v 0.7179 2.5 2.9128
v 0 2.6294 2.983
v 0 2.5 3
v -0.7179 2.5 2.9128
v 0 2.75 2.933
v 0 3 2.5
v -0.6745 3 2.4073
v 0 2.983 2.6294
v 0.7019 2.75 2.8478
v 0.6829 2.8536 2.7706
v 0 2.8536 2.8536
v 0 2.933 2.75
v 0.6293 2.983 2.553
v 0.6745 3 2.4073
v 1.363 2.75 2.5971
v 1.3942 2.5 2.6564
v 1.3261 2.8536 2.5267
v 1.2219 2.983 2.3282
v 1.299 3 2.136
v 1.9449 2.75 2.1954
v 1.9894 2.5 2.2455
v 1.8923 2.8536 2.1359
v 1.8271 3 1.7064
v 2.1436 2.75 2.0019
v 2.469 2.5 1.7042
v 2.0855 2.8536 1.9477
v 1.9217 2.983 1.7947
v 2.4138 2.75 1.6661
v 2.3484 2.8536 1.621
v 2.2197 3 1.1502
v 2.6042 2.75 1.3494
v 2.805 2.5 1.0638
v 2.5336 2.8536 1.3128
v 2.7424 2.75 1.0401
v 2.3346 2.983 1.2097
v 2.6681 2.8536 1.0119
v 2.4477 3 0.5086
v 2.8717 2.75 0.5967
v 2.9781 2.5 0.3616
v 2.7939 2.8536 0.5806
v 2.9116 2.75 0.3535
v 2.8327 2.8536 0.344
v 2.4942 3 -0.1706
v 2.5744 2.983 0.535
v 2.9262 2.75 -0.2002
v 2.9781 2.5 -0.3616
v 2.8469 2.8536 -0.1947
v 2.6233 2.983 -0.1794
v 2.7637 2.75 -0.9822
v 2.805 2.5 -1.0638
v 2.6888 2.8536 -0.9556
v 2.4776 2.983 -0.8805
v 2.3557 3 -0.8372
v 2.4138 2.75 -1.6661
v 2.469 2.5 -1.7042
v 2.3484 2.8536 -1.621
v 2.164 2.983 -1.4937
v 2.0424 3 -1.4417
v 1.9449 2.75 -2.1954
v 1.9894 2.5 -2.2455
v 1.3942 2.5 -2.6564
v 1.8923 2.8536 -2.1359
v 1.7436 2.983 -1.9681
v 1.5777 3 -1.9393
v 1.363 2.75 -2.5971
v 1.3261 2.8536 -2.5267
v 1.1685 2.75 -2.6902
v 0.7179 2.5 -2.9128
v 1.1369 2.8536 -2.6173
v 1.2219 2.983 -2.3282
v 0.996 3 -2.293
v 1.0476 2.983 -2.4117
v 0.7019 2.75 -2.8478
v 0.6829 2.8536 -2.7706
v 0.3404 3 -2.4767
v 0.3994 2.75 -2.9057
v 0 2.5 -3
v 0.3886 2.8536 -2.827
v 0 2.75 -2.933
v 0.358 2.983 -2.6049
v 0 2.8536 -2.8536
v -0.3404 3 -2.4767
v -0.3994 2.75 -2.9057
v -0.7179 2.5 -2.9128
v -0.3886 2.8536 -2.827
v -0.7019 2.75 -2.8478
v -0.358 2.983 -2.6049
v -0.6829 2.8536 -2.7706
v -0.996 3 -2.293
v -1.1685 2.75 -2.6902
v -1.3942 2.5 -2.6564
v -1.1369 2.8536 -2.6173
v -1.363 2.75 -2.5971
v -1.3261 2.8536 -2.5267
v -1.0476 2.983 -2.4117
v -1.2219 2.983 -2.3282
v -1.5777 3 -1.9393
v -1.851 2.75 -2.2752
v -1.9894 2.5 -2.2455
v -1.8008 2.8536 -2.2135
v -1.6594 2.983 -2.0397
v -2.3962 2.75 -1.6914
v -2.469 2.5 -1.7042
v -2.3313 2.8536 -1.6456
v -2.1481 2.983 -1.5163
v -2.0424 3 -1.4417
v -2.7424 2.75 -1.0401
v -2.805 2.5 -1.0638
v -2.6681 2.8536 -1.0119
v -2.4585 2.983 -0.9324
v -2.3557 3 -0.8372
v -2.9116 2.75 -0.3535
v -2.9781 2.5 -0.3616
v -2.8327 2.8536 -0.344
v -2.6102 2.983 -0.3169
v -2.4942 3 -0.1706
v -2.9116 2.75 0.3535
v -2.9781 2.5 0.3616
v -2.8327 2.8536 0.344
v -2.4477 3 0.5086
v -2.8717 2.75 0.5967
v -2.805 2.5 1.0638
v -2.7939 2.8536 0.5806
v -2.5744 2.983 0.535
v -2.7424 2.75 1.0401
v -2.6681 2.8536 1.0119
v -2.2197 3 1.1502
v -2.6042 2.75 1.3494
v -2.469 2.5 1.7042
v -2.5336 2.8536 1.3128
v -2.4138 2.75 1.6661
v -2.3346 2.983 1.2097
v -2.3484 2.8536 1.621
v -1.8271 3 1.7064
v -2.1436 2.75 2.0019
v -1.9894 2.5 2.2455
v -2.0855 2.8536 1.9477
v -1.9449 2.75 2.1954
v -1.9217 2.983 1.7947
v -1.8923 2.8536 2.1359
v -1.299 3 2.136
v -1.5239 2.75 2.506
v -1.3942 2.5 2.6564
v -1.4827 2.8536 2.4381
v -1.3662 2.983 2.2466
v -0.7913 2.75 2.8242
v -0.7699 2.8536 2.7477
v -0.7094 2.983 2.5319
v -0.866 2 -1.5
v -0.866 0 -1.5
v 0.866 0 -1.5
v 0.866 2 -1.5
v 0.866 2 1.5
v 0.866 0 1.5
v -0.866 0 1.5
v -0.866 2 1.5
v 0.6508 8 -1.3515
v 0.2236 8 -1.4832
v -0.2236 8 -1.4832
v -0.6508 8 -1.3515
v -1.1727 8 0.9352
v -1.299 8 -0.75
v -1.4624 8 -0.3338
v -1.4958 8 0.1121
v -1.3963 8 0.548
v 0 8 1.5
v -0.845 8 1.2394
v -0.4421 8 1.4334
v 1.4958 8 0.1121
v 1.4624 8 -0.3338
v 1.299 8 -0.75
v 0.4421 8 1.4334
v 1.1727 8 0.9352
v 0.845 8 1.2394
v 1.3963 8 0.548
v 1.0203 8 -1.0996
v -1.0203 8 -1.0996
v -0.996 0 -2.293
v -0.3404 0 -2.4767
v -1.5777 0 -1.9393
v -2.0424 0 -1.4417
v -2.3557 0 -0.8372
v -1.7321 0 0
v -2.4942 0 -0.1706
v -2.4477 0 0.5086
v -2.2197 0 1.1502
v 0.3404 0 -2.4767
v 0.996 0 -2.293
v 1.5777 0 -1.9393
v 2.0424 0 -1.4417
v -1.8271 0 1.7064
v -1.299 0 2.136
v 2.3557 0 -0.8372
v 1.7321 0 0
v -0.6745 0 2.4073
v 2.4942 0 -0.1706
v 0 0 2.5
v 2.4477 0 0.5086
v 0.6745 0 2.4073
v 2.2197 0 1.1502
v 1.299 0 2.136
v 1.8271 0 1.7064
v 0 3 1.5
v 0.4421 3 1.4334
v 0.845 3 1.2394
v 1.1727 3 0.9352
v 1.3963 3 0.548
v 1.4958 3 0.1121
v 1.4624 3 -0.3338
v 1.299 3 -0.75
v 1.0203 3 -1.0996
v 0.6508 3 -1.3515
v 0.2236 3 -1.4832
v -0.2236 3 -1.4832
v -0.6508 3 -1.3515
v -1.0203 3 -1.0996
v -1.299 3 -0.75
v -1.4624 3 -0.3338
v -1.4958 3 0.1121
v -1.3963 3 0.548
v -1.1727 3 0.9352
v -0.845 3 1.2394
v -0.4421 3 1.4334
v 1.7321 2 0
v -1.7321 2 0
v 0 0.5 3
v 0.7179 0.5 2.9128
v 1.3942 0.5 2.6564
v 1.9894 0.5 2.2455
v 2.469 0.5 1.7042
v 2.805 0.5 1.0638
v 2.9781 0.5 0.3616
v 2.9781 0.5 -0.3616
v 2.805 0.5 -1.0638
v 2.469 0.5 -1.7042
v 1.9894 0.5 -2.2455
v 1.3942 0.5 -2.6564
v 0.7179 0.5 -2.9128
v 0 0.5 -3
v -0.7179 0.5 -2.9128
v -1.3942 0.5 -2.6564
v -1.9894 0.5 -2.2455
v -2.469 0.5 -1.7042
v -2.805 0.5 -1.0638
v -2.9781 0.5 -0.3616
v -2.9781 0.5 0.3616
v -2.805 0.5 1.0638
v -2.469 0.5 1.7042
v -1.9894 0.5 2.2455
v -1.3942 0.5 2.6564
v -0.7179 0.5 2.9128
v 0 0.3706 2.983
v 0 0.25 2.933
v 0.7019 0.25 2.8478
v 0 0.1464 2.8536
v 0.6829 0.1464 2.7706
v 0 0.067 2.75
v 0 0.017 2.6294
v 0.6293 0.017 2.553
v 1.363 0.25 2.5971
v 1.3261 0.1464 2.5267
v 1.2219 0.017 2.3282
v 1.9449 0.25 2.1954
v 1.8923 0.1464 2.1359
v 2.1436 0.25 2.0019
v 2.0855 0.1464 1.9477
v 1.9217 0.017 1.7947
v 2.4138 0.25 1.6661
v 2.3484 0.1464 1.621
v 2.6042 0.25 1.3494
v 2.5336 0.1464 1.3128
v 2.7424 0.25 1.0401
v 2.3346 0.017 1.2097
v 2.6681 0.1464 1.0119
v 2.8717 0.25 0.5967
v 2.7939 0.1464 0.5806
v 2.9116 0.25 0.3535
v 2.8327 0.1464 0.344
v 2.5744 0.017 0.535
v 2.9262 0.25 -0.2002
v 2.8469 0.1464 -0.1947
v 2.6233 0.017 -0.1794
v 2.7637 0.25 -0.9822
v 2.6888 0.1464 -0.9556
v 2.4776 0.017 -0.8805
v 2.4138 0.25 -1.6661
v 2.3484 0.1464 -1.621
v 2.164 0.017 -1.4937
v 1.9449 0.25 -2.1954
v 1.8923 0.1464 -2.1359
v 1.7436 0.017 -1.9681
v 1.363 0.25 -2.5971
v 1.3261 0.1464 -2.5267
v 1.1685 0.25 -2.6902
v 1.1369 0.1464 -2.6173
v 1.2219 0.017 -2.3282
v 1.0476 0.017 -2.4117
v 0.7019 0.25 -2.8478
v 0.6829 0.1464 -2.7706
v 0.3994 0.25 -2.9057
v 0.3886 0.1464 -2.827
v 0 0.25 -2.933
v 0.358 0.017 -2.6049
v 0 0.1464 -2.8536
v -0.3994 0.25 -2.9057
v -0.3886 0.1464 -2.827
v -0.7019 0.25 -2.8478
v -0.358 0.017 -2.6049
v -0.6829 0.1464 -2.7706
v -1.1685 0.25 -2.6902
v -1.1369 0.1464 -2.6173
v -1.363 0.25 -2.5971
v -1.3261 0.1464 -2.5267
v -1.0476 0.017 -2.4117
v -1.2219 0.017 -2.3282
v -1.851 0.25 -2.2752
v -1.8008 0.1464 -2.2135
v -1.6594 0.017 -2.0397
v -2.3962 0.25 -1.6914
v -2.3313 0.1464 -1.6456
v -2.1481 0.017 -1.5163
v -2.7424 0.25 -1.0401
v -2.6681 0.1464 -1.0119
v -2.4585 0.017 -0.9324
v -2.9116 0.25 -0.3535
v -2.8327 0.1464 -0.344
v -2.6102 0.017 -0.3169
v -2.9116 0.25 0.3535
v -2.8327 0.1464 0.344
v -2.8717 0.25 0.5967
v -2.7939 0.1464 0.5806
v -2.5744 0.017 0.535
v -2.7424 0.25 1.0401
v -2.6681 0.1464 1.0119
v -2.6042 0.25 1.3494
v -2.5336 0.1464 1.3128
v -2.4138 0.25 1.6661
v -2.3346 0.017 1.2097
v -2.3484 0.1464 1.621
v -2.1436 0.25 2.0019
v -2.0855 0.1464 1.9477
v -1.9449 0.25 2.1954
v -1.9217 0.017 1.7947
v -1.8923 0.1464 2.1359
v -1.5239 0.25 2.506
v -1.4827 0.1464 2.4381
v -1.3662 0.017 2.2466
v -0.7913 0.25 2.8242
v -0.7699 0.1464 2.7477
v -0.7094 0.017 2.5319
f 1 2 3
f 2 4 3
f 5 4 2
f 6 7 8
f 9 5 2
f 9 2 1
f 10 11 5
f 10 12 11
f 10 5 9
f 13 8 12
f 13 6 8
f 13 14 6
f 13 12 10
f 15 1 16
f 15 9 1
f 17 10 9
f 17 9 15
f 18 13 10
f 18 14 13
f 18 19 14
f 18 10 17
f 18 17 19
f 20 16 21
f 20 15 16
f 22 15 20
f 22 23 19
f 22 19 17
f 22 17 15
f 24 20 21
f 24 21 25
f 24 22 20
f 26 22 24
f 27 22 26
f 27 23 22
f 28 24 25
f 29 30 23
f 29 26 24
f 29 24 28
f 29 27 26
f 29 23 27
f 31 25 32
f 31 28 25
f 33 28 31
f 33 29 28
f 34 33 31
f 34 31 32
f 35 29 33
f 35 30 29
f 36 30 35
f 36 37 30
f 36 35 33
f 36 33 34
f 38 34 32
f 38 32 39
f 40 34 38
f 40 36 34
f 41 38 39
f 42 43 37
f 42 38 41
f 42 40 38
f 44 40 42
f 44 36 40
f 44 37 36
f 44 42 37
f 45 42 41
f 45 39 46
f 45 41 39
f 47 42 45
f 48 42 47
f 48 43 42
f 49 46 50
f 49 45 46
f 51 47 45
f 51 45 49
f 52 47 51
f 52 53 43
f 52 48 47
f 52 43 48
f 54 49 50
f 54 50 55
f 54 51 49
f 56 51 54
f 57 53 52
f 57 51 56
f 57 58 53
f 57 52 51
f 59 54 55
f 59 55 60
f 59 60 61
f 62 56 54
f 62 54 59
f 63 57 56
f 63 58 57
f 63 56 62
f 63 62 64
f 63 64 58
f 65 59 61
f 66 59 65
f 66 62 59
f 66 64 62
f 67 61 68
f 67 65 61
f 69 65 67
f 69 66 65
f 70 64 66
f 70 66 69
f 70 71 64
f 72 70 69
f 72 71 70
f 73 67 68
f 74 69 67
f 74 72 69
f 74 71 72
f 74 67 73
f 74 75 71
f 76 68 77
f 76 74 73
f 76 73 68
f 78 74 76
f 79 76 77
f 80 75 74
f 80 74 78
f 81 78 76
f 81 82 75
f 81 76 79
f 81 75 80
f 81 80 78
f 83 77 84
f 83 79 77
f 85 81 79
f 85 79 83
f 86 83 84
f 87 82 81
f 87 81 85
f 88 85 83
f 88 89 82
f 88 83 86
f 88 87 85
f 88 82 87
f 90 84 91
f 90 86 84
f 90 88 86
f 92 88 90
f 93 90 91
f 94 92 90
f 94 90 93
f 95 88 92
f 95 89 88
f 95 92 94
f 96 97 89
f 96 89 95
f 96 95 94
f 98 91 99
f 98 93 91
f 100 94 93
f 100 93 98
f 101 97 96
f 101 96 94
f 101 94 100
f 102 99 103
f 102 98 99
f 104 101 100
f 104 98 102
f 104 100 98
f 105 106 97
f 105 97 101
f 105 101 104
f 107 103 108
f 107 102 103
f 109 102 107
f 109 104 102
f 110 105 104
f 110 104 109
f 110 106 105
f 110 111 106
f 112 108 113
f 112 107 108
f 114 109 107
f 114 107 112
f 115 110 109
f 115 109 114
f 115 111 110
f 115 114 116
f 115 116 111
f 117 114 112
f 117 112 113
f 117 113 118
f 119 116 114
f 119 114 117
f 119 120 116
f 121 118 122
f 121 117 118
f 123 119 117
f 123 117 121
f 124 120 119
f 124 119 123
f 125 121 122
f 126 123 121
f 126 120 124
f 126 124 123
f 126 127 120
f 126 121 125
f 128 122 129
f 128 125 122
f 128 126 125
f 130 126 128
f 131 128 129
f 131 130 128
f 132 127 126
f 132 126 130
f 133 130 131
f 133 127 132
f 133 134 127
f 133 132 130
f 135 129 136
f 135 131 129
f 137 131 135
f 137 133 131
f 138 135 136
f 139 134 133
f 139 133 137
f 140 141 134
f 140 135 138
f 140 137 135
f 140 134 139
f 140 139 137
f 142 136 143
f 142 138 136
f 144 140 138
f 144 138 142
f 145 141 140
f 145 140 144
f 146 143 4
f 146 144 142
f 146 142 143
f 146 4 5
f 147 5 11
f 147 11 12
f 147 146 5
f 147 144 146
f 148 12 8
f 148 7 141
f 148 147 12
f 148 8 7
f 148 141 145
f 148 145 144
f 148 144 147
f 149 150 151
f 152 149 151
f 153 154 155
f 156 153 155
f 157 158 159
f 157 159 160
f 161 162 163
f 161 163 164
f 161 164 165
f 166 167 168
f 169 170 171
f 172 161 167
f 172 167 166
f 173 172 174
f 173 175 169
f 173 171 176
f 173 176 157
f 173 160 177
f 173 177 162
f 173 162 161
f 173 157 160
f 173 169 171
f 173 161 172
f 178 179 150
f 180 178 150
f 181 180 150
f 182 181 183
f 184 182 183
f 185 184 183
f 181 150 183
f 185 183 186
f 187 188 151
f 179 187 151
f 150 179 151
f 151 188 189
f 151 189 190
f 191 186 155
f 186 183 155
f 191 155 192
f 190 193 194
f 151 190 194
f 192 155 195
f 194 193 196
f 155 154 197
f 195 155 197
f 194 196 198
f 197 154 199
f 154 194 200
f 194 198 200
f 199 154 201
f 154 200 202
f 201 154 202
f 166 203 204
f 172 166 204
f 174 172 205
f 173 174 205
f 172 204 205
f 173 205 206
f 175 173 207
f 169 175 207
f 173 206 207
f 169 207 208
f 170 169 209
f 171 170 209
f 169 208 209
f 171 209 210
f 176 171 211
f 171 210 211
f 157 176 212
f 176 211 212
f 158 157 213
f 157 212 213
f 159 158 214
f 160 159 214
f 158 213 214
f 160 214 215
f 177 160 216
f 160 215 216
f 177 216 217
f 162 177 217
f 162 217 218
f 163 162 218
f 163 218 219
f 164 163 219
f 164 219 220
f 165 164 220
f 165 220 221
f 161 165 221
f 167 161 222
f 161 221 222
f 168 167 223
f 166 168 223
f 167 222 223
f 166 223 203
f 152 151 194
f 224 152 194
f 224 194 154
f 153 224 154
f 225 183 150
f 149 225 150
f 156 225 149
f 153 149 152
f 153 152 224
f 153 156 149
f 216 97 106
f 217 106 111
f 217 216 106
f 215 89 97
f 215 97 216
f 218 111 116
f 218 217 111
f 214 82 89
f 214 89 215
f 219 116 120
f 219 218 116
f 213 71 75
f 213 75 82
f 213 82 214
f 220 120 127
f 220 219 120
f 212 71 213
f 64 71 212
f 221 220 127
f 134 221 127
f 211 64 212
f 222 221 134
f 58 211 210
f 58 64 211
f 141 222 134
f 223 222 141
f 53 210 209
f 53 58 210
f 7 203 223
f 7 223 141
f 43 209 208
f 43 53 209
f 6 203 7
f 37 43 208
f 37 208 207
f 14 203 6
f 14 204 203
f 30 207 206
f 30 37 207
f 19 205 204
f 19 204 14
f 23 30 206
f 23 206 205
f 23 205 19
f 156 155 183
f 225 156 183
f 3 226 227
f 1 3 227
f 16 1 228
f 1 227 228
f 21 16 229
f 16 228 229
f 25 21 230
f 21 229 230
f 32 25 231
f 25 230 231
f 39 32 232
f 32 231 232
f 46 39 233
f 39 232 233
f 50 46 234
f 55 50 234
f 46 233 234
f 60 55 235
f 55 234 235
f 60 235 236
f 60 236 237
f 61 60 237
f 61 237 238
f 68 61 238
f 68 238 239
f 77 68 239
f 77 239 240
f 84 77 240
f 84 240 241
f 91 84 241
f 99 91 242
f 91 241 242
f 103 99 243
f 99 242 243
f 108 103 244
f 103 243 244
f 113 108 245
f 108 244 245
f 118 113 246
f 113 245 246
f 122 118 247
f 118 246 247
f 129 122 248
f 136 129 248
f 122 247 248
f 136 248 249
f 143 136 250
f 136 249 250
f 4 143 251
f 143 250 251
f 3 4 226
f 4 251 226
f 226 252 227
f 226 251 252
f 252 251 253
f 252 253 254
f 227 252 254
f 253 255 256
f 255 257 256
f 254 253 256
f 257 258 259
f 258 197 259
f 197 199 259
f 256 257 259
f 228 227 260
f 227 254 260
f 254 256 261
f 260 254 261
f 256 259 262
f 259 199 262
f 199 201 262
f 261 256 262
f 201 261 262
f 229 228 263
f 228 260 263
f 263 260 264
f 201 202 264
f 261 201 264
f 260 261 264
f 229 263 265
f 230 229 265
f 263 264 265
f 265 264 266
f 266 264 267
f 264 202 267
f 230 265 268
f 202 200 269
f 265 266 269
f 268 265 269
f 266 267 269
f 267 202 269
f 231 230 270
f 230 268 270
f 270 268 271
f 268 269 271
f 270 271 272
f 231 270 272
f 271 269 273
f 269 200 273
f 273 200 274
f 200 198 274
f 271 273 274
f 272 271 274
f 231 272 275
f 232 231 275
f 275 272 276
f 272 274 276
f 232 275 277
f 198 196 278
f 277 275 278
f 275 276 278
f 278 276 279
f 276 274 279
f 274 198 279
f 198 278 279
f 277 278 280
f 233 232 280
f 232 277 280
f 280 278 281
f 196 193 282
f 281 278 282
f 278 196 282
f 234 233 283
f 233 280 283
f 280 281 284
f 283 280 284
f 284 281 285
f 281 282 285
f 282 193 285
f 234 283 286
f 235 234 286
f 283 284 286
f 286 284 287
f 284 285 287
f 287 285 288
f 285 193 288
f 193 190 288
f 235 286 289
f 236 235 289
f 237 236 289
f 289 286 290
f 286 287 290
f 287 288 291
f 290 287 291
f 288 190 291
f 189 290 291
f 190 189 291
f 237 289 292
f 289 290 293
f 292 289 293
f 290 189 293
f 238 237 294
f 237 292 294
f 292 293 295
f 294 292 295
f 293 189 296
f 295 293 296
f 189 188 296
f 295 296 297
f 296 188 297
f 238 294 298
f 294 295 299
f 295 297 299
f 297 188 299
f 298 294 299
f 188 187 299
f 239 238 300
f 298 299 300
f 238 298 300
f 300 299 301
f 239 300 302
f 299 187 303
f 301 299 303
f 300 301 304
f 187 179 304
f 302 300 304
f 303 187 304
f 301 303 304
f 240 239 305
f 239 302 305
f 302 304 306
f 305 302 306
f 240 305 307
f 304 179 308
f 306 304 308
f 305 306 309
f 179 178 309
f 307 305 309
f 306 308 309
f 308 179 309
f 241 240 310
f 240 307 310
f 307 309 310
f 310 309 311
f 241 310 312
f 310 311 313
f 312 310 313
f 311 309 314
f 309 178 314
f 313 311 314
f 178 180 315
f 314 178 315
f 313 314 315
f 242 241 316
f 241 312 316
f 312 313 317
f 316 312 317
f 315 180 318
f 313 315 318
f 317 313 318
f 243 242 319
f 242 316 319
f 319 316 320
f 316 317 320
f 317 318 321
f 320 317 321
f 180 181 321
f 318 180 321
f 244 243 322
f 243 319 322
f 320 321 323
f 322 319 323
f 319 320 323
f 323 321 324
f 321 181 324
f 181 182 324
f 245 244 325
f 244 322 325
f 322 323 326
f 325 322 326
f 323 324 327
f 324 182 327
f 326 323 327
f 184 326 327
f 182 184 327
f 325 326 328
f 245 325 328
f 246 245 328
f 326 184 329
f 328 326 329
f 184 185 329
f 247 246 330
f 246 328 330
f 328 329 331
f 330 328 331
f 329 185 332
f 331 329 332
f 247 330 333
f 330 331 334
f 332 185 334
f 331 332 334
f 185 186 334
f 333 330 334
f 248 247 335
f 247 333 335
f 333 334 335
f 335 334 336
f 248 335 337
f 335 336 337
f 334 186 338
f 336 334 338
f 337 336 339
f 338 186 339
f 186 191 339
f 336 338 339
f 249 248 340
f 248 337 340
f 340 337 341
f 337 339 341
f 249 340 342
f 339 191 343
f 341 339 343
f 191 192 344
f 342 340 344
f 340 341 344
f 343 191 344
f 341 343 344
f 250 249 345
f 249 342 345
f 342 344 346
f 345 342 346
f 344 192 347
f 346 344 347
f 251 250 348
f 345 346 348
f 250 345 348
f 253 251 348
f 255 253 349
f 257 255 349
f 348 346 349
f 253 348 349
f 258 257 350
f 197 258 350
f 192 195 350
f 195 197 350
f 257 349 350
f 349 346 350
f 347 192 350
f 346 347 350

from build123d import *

# Parameters (mm, degrees)
IZIM1_R                     = 3
Y_KSEKLIK_EKSTR_ZYON1_DEPTH = 3
IZIM2_R                     = 1.5
Y_KSEKLIK_EKSTR_ZYON2_DEPTH = 5
RADYUS1_R                   = 0.5
KES_EKSTR_ZYON1_DEPTH       = 2


with BuildPart() as part:
    # Çizim1 → Yükseklik-Ekstrüzyon1 (new body)
    with BuildSketch(Plane(origin=(0, 0, 0), x_dir=(1, 0, 0), z_dir=(0, 1, 0))):
        with Locations(Location((0, 0, 0), (0, 0, 270))):
            Circle(IZIM1_R)
    extrude(amount=Y_KSEKLIK_EKSTR_ZYON1_DEPTH)

    # Çizim2 → Yükseklik-Ekstrüzyon2 (add)
    with BuildSketch(Plane(origin=(0, 3, 0), x_dir=(1, 0, 0), z_dir=(0, 1, 0))):
        with Locations(Location((0, 0, 0), (0, 0, 270))):
            Circle(IZIM2_R)
    extrude(amount=Y_KSEKLIK_EKSTR_ZYON2_DEPTH)

    # Radyus1
    radyus1_edges = [part.edges().sort_by_distance(p)[0] for p in [
        (0, 0, -3),
        (0, 3, -3),
    ]]
    fillet(radyus1_edges, radius=RADYUS1_R)

    # Çizim3 → Kes-Ekstrüzyon1 (cut)
    with BuildSketch(Plane.XZ):
        Polygon((1.732050808, 0), (0.866025404, 1.5), (-0.866025404, 1.5), (-1.732050808, 0), (-0.866025404, -1.5), (0.866025404, -1.5), align=None)
    extrude(amount=-KES_EKSTR_ZYON1_DEPTH, mode=Mode.SUBTRACT)


solid = part.part
